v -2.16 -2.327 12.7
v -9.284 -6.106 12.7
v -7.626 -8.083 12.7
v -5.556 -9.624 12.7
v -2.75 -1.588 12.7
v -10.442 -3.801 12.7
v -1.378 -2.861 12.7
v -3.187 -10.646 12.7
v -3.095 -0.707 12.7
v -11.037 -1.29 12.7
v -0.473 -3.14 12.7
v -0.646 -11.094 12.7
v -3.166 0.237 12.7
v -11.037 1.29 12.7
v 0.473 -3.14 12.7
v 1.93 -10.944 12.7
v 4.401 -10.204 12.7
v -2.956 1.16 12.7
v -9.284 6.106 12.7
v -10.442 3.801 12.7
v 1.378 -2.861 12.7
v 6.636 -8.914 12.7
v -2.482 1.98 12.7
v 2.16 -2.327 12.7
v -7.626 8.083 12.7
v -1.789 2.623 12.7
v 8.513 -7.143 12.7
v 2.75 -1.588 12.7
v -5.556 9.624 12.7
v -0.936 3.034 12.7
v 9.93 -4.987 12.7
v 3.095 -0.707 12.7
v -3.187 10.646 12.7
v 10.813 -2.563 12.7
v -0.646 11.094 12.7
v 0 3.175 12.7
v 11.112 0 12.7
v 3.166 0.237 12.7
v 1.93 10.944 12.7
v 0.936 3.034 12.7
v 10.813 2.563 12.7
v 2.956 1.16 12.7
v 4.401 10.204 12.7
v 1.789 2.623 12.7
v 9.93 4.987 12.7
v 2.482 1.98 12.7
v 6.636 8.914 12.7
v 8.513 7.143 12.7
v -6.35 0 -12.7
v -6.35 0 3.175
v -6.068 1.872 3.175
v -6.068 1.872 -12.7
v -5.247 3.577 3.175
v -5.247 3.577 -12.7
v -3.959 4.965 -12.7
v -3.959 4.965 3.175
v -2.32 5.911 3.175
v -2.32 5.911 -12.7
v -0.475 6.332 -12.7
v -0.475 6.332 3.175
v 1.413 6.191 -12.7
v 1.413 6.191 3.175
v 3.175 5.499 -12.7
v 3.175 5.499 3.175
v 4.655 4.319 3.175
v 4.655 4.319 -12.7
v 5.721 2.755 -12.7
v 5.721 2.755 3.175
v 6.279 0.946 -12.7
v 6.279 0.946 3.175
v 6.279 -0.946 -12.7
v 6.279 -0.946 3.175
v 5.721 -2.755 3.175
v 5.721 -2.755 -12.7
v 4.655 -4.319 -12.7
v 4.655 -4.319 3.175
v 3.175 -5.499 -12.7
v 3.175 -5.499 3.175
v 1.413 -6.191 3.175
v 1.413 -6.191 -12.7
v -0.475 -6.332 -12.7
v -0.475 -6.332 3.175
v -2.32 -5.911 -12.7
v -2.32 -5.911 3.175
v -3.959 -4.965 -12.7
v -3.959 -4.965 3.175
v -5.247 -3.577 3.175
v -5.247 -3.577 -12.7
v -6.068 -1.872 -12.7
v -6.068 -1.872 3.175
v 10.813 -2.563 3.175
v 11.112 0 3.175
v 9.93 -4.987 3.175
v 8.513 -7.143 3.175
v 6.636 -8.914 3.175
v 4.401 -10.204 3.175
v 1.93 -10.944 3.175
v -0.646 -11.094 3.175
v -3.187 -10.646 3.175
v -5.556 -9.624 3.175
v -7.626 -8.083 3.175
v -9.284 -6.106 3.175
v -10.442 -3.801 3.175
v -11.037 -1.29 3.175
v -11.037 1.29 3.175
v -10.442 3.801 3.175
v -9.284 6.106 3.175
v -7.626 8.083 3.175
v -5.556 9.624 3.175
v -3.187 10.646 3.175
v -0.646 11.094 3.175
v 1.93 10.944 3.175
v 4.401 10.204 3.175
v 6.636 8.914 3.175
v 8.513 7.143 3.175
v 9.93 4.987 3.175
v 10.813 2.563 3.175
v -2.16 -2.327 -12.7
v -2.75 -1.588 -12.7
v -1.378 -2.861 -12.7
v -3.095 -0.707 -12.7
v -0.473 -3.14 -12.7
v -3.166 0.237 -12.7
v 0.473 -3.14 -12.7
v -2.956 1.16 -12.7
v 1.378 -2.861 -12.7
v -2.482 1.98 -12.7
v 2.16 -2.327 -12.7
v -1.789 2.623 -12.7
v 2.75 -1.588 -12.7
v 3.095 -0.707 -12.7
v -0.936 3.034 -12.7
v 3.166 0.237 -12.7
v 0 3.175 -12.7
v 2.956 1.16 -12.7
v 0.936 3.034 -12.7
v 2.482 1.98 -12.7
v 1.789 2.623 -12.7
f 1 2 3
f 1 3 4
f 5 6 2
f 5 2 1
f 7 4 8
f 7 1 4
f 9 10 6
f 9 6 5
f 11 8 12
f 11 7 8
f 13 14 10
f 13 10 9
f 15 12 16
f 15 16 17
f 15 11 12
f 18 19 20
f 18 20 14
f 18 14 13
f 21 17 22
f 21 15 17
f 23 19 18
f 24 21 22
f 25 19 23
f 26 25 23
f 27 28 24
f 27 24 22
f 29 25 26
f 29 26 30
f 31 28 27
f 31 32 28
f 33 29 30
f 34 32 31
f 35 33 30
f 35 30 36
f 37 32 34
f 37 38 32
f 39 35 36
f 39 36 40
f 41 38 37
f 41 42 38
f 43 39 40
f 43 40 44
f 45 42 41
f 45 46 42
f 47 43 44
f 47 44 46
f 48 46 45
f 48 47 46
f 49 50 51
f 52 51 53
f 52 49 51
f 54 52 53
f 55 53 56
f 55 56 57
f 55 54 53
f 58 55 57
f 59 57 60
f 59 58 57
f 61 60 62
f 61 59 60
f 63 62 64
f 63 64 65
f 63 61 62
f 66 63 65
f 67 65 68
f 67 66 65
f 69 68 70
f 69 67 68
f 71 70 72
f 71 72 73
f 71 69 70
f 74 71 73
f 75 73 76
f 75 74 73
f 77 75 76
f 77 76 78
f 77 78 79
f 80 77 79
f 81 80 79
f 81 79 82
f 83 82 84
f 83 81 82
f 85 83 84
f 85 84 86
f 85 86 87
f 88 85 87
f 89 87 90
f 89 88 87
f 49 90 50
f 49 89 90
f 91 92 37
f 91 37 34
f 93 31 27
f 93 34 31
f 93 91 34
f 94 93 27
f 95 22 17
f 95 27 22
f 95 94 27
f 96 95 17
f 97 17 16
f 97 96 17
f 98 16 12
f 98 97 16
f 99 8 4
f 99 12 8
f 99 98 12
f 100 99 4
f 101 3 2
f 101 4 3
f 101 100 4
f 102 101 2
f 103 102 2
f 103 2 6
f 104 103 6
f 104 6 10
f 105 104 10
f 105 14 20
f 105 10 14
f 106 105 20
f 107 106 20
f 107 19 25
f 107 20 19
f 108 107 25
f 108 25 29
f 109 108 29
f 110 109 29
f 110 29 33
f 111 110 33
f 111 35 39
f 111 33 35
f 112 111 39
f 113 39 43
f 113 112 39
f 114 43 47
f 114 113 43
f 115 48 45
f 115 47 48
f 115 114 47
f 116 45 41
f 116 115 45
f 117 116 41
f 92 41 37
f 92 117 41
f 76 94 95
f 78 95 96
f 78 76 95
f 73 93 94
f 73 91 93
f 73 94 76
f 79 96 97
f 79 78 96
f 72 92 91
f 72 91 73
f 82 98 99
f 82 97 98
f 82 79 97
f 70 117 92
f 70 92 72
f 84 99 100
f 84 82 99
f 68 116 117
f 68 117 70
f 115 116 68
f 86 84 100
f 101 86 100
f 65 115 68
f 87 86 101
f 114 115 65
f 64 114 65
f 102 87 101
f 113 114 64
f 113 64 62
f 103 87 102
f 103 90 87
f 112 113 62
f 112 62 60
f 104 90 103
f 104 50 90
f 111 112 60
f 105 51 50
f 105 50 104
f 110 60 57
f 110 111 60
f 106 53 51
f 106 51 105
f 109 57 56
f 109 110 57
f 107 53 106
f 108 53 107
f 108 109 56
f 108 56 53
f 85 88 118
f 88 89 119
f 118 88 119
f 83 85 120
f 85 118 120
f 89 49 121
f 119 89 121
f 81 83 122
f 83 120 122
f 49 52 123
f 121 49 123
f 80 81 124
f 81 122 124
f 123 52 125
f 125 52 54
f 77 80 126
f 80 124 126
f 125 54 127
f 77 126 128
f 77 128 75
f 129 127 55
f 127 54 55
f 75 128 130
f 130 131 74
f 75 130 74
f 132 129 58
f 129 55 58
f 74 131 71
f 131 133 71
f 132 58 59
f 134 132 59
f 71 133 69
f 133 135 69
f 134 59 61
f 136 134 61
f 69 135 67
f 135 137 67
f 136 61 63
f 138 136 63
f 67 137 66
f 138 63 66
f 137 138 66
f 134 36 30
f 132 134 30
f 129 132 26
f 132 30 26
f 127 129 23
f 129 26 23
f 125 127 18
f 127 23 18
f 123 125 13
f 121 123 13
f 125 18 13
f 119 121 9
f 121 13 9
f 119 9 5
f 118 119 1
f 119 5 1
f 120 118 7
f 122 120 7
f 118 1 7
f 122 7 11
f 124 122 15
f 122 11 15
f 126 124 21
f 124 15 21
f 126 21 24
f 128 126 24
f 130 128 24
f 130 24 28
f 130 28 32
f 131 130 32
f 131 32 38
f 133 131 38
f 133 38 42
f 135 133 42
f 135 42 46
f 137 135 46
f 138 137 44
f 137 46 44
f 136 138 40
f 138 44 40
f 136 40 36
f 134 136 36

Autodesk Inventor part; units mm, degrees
ref_plane "YZ Plane" through (0, 0, 0) normal (1, 0, 0) x (0, 1, 0)
ref_plane "XZ Plane" through (0, 0, 0) normal (0, 1, 0) x (-1, 0, 0)
ref_plane "XY Plane" through (0, 0, 0) normal (0, 0, 1) x (1, 0, 0)
sketch "Sketch1" plane through (0, 0, 0) normal (0, 0, 1) x (1, 0, 0)
  circle A0 centre (0, 0) radius 11.1125
  dimension "d0" = 22.225
extrude "Extrusion1" add sketch "Sketch1" along normal mid plane 25.4
sketch "Sketch3" plane through (0, 0, -12.7) normal (0, 0, -1) x (-1, 0, 0)
  circle A0 centre (0, 0) radius 11.1125 projected
  circle A1 centre (0, 0) radius 6.35
  dimension "d6" = 12.7
extrude "Extrusion3" cut sketch "Sketch3" against normal blind 15.875
sketch "Sketch5" plane through (0, 0, -12.7) normal (0, 0, -1) x (-1, 0, 0)
  circle A0 centre (0, 0) radius 6.35 construction
hole "Hole2" at (0, 0, -12.7) direction (0, 0, 1) diameter 6.35 end through all
properties part number "AR-013" material "Aluminum 6061"
